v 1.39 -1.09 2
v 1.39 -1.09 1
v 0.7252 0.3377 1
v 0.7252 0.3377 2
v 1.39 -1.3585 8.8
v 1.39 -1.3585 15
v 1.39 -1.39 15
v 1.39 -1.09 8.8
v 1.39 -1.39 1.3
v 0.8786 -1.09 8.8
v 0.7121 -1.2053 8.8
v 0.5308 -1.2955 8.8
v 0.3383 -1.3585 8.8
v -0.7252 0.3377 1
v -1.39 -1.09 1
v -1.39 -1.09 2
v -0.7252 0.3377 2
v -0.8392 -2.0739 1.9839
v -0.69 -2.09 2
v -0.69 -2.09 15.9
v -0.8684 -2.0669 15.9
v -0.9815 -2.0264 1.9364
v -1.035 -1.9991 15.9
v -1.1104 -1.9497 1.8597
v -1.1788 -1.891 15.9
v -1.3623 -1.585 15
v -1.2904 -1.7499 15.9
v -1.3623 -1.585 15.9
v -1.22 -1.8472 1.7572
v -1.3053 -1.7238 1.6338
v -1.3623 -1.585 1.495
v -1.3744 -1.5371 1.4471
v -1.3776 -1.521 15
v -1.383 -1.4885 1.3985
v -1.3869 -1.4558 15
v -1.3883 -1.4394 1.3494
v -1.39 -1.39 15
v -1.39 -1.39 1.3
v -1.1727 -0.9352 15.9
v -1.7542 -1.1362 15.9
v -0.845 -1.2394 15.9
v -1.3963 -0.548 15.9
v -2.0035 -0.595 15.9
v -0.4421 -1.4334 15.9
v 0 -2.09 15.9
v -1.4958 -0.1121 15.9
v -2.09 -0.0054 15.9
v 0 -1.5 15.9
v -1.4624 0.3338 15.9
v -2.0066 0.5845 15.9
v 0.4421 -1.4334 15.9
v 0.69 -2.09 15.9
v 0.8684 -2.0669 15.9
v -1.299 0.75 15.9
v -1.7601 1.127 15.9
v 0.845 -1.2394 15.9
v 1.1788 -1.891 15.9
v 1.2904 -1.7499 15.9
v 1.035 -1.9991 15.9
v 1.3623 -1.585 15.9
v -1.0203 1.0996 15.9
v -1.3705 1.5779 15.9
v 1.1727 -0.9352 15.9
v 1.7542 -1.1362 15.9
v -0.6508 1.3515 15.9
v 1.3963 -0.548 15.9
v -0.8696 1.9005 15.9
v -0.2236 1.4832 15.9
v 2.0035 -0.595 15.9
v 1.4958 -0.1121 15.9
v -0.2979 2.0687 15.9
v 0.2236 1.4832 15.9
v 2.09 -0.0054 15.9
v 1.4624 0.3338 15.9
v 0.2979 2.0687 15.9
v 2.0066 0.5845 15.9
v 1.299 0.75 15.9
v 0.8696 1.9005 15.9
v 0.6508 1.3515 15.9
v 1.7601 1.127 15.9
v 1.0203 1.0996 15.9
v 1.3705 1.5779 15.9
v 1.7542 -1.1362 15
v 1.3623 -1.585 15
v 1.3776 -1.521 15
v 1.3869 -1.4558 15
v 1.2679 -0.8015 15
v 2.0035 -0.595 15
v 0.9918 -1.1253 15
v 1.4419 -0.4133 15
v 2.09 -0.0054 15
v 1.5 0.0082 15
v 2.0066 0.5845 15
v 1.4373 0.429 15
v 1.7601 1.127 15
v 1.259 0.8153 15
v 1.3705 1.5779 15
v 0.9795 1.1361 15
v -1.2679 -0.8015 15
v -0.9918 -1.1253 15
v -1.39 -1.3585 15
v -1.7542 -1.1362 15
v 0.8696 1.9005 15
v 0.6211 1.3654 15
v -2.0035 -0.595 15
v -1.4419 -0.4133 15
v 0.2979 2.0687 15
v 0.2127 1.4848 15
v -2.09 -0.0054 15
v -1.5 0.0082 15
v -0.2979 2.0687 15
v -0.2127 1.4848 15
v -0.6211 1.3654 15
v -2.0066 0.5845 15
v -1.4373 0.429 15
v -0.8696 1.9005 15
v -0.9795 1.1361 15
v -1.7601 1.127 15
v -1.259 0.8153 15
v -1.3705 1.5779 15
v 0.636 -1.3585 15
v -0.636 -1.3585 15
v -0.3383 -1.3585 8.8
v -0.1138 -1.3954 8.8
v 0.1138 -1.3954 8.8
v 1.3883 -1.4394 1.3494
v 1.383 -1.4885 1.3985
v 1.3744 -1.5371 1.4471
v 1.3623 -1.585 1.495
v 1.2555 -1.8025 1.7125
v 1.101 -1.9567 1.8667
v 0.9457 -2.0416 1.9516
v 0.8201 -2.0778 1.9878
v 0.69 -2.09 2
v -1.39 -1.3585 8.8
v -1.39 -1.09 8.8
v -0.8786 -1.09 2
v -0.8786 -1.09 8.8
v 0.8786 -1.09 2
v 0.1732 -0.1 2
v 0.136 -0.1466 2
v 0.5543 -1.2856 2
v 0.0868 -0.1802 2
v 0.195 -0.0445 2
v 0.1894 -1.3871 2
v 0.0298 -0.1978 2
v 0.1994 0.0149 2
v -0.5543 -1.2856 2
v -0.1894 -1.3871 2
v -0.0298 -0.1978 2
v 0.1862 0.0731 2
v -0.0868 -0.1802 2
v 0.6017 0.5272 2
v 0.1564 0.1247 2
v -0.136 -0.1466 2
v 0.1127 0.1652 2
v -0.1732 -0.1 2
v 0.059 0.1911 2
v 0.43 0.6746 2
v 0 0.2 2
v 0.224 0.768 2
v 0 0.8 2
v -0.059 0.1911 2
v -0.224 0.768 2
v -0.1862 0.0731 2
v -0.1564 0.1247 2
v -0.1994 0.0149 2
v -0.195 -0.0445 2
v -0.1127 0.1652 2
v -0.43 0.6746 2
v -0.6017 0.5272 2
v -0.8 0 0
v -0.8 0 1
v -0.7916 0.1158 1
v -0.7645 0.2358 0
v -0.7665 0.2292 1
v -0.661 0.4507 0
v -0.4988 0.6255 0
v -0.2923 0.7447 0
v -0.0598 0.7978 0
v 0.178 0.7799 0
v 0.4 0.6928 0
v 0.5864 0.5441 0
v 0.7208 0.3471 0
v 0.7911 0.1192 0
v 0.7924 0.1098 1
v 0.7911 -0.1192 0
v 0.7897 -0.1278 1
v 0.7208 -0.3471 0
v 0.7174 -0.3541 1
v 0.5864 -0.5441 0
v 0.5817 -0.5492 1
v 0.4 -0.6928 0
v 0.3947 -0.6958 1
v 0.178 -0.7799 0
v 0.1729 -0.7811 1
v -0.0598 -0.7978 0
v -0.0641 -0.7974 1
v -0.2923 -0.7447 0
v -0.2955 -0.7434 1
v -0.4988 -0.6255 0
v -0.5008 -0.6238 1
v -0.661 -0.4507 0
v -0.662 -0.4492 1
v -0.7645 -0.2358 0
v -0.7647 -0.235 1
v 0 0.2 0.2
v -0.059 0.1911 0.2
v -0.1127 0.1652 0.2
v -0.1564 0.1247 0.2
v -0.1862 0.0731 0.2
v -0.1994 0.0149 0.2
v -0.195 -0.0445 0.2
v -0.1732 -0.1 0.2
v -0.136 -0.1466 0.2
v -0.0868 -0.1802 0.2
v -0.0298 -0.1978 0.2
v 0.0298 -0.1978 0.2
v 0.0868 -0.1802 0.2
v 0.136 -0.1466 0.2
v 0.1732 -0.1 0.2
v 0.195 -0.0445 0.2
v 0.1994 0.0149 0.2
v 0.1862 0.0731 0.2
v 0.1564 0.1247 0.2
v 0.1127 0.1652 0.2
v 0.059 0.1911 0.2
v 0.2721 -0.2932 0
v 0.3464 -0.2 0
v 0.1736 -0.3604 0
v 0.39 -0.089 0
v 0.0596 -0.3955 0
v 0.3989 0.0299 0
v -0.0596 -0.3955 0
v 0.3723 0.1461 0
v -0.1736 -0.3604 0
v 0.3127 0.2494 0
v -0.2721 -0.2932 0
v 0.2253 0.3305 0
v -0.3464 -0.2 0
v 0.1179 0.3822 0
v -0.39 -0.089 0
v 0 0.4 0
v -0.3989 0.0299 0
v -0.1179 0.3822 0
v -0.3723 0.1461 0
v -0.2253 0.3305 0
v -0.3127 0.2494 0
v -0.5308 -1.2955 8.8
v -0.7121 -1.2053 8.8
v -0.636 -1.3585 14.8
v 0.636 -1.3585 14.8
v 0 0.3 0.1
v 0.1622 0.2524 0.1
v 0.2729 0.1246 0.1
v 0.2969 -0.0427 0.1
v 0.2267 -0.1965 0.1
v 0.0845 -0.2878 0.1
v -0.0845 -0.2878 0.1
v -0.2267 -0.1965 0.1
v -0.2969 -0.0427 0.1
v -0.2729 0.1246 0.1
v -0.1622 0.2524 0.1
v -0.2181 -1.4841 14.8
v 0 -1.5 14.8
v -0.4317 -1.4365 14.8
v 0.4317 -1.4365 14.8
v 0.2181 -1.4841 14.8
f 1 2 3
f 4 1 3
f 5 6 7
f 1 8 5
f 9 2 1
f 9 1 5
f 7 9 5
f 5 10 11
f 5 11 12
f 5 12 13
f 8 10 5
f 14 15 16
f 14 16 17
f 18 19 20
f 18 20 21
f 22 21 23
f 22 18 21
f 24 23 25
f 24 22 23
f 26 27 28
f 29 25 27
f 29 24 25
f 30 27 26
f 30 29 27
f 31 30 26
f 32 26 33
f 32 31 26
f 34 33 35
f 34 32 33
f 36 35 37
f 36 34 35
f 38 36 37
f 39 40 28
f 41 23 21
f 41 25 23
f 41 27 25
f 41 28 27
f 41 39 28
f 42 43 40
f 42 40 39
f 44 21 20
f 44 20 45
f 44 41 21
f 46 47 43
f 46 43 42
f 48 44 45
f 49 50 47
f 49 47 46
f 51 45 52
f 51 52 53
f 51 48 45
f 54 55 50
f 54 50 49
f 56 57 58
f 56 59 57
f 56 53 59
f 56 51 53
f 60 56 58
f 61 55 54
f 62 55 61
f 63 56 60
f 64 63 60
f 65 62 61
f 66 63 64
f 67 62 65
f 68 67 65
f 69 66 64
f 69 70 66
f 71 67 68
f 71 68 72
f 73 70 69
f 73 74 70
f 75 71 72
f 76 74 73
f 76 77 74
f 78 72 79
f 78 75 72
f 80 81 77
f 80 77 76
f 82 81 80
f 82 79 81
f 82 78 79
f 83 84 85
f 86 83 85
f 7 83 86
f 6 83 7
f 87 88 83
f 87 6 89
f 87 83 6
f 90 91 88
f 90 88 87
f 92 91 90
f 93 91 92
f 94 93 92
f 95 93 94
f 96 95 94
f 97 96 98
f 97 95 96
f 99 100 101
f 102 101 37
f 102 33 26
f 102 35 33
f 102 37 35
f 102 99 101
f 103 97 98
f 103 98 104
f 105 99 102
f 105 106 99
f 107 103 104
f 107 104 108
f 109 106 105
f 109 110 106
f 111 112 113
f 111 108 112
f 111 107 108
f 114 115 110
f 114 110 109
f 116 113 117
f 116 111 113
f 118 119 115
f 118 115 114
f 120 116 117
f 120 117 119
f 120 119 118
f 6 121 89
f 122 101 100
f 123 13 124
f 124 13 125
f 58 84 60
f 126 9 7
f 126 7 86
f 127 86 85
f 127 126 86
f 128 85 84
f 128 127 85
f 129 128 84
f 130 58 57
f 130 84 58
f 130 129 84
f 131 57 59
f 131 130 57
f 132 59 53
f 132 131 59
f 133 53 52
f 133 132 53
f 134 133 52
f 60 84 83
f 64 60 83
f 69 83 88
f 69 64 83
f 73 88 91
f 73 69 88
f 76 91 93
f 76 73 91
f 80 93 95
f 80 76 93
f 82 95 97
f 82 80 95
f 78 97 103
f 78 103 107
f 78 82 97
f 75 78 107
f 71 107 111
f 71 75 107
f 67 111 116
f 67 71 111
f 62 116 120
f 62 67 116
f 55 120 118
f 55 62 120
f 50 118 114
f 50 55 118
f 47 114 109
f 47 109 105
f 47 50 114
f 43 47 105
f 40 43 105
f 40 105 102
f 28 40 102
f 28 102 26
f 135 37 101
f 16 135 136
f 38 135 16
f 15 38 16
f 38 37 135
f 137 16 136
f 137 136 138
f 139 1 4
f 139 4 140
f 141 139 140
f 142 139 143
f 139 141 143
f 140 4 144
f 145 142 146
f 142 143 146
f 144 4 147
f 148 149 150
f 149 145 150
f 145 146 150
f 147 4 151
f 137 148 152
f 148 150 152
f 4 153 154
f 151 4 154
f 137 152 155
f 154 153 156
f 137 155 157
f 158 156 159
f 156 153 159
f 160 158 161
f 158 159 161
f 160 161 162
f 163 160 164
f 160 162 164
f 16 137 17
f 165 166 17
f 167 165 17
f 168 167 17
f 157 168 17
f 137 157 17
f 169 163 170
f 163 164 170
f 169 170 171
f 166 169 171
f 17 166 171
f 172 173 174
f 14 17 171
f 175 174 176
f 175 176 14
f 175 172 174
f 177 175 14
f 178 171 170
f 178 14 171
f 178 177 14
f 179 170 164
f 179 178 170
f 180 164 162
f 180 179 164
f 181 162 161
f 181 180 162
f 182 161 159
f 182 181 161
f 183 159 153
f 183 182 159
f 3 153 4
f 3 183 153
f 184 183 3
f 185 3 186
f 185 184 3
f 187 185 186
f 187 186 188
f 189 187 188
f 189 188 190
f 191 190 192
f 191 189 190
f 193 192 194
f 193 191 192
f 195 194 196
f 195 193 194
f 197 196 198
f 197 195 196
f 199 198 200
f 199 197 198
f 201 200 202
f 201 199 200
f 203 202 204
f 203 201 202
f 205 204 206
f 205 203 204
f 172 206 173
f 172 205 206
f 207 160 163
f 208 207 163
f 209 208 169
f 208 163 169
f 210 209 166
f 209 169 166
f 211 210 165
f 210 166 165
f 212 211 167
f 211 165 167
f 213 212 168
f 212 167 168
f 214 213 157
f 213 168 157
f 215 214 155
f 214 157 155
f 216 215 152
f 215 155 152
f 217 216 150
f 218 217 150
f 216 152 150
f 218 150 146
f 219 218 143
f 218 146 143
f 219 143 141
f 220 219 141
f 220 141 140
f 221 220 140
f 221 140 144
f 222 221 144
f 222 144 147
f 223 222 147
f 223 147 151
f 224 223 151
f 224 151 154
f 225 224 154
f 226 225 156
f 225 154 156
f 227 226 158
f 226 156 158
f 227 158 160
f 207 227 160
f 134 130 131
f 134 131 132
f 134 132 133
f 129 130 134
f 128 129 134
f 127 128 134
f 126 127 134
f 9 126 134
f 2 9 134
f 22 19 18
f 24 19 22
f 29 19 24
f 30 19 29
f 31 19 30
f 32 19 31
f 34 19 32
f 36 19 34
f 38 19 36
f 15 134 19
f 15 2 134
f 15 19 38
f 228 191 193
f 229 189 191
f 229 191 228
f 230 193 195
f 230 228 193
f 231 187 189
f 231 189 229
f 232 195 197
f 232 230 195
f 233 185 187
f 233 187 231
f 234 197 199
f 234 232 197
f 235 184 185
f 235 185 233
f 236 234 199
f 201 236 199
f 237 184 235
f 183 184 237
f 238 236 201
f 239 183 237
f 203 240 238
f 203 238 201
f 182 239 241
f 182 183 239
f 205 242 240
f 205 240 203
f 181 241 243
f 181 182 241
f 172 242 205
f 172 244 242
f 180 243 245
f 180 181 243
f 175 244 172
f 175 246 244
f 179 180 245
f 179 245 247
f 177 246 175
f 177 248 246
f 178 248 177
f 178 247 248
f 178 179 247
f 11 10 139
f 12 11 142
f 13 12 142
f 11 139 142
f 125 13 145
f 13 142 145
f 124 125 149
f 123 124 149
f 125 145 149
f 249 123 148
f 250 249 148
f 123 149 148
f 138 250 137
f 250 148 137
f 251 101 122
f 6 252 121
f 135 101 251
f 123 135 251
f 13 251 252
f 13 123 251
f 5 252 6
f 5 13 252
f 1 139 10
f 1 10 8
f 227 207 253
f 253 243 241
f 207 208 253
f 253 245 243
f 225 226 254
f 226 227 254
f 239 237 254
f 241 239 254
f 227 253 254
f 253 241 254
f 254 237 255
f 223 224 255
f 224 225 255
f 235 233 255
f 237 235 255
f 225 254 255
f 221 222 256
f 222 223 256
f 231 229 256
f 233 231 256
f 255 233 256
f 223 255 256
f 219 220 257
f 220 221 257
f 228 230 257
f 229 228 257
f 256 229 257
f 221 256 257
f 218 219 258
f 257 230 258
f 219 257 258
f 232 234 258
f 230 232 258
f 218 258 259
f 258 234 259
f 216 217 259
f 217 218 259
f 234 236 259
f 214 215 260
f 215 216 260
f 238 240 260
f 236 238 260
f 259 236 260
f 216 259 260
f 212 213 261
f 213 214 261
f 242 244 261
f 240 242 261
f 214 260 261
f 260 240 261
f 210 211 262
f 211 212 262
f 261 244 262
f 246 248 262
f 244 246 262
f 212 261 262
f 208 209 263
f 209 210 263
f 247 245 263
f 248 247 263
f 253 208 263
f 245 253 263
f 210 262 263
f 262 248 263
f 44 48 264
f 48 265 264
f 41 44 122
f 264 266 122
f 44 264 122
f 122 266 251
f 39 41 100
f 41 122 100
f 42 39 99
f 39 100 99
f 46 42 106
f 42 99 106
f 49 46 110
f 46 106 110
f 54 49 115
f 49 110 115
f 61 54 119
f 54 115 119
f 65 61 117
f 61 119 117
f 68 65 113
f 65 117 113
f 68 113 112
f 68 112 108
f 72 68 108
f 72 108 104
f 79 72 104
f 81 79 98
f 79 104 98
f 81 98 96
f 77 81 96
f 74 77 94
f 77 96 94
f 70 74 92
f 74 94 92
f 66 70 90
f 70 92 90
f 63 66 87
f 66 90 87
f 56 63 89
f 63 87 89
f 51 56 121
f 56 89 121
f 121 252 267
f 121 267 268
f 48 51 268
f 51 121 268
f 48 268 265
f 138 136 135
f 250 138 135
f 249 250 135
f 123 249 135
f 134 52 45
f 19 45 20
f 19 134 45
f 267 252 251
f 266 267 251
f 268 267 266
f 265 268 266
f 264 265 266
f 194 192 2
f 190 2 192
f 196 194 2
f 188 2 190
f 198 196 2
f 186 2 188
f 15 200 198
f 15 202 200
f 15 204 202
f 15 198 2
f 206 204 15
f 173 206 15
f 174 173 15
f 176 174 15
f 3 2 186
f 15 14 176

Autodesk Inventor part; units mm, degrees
ref_plane "YZ Plane" through (0, 0, 0) normal (1, 0, 0) x (0, 1, 0)
ref_plane "XZ Plane" through (0, 0, 0) normal (0, 1, 0) x (-1, 0, 0)
ref_plane "XY Plane" through (0, 0, 0) normal (0, 0, 1) x (1, 0, 0)
sketch "Sketch1" plane through (0, 0, 0) normal (0, 0, 1) x (1, 0, 0)
  line L0 (-1.39, -1.09) -> (1.39, -1.09)
  line L1 (1.39, -1.09) -> (1.39, -2.09)
  line L2 (1.39, -2.09) -> (-1.39, -2.09)
  line L3 (-1.39, -2.09) -> (-1.39, -1.09)
  point P0 (0, 0)
  dimension "d0" = 1
  dimension "d1" = 1.39
  dimension "d2" = 2.78
  dimension "d3" = 1.09
extrude "Extrusion1" add sketch "Sketch1" along normal blind 15.9
sketch "Sketch2" plane through (-1.39, -1.09, 0) normal (0, 1, 0) x (1, 0, 0)
  line L0 (0, 0) -> (0, -15.9) projected
  line L1 (0, -8.8) -> (2.78, -8.8)
  line L2 (2.78, -8.8) -> (2.78, -15.9)
  line L3 (2.78, -15.9) -> (0, -15.9)
  line L4 (0, -15.9) -> (0, -8.8)
  point P0 (1.39, 0)
  dimension "d6" = 7.1
extrude "Extrusion2" cut sketch "Sketch2" against normal blind 0.2685
sketch "Sketch3" plane through (0, 0, 0) normal (0, 0, -1) x (-1, 0, 0)
  line L0 (-1.39, -1.09) -> (1.39, -1.09)
  line L1 (1.39, -1.09) -> (1.39, 1.69)
  line L2 (1.39, 1.69) -> (-1.39, 1.69)
  line L3 (-1.39, 1.69) -> (-1.39, -1.09)
  point P0 (0, 0)
  dimension "d9" = 2.78
extrude "Extrusion3" add sketch "Sketch3" against normal blind 2
sketch "Sketch4" plane through (0, 0, 0) normal (0, 0, -1) x (-1, 0, 0)
  line L0 (-1.39, 1.69) -> (-1.39, -2.09) projected
  line L1 (1.39, -2.09) -> (1.39, 1.69) projected
  line L2 (1.39, 1.69) -> (-1.39, 1.69) projected
  circle A0 centre (0, 0) radius 0.8
  line L3 (-1.39, -1.3585) -> (1.39, -1.3585) projected
  line L4 (-1.39, -1.09) -> (1.39, -1.09) projected
  line L5 (-1.39, -1.09) -> (-0.7252, 0.3377)
  line L6 (1.39, -1.09) -> (0.7252, 0.3377)
  dimension "d12" = 1.6
extrude "Extrusion4" cut sketch "Sketch4" against normal through all contours L2 L1 L6 A0 L5 L0
sketch "Sketch5" plane through (0, 0, 0) normal (0, 0, -1) x (-1, 0, 0)
  line L0 (-0.7252, 0.3377) -> (-1.39, -1.09) projected
  line L1 (-1.39, -1.09) -> (-1.39, -2.09) projected
  line L2 (-1.39, -2.09) -> (1.39, -2.09) projected
  line L3 (1.39, -2.09) -> (1.39, -1.09) projected
  line L4 (1.39, -1.09) -> (0.7252, 0.3377) projected
  arc A0 (0.7252, 0.3377) -> (-0.7252, 0.3377) centre (0, 0) ccw projected
  circle A1 centre (0, 0) radius 0.8
extrude "Extrusion5" cut sketch "Sketch5" against normal blind 1 contours A1 L4 L3 L2 L1 L0
hole "Hole1" at (0, 0, 0) direction (0, 0, 1) diameter 0.4 end through all countersink diameter 0.8 countersink angle 90
sketch "Sketch6" plane through (-1.39, -2.09, 15.9) normal (0, -1, 0) x (1, 0, 0)
  line L0 (2.78, -15.9) -> (2.78, 0) projected
  line L1 (2.78, 0) -> (0, 0) projected
  circle A0 centre (1.39, -1.5) radius 0.5
  point P0 (2.78, -14.9)
  point P1 (1.39, -15.9)
  point P2 (1.39, -1)
  point P3 (1.39, -2)
  dimension "d26" = 1
  dimension "d27" = 1.39
  dimension "d28" = 1.5
extrude "Extrusion6" [suppressed]
chamfer "Chamfer1" distance 1 angle 45 1 edges at (0, -2.09, 1)
ref_plane "Work Plane1" through (0, -2.09, 14.9) normal (0, 0, 1) x (1, 0, 0)
ref_plane "Work Plane2" through (0, -2.09, 13.9) normal (0, 0, 1) x (1, 0, 0)
sketch "Sketch10" plane through (0, 0, 15.9) normal (0, 0, 1) x (1, 0, 0)
  line L0 (1.39, -1.3585) -> (-1.39, -1.3585) projected
  circle A0 centre (0, 0) radius 2.09
  line L1 (1.39, -2.09) -> (-1.39, -2.09) projected
  dimension "d54" = 4.18
extrude "Extrusion7" add sketch "Sketch10" against normal blind 0.9
sketch "Sketch11" plane through (0, 0, 15.9) normal (0, 0, 1) x (1, 0, 0)
  arc A0 (1.39, -1.5608) -> (-1.39, -1.5608) centre (0, 0) ccw projected
  circle A1 centre (0, 0) radius 1.3
  point P0 (1.6431, -0.954)
  point P1 (-1.6431, -0.954)
  dimension "d41" = 2.6
hole "Hole2" at (0, 0, 15.9) direction (0, 0, -1) diameter 3 depth 1.1
fillet "Fillet3" radius 0.7 2 edges at (1.39, -2.09, 8.95) (-1.39, -2.09, 8.95)
sketch "Sketch13" plane through (-1.39, -1.09, 8.8) normal (0, 0, 1) x (1, 0, 0)
  point P0 (1.39, 1.09)
  point P1 (1.39, 1.09)
hole "Hole4" at (0, 0, 8.8) at (0, 0, 8.8) direction (0, 0, -1) diameter 2.8 depth 6.8
sketch "Sketch15" plane through (0, -2.09, 14.9) normal (0, 0, 1) x (1, 0, 0)
  point P0 (0, 2.09)
  point P1 (0, 2.09)
hole "Hole5" [suppressed]
properties part number "MU_Motor_Asm_Frame_new3" material "Aluminum-6061"
